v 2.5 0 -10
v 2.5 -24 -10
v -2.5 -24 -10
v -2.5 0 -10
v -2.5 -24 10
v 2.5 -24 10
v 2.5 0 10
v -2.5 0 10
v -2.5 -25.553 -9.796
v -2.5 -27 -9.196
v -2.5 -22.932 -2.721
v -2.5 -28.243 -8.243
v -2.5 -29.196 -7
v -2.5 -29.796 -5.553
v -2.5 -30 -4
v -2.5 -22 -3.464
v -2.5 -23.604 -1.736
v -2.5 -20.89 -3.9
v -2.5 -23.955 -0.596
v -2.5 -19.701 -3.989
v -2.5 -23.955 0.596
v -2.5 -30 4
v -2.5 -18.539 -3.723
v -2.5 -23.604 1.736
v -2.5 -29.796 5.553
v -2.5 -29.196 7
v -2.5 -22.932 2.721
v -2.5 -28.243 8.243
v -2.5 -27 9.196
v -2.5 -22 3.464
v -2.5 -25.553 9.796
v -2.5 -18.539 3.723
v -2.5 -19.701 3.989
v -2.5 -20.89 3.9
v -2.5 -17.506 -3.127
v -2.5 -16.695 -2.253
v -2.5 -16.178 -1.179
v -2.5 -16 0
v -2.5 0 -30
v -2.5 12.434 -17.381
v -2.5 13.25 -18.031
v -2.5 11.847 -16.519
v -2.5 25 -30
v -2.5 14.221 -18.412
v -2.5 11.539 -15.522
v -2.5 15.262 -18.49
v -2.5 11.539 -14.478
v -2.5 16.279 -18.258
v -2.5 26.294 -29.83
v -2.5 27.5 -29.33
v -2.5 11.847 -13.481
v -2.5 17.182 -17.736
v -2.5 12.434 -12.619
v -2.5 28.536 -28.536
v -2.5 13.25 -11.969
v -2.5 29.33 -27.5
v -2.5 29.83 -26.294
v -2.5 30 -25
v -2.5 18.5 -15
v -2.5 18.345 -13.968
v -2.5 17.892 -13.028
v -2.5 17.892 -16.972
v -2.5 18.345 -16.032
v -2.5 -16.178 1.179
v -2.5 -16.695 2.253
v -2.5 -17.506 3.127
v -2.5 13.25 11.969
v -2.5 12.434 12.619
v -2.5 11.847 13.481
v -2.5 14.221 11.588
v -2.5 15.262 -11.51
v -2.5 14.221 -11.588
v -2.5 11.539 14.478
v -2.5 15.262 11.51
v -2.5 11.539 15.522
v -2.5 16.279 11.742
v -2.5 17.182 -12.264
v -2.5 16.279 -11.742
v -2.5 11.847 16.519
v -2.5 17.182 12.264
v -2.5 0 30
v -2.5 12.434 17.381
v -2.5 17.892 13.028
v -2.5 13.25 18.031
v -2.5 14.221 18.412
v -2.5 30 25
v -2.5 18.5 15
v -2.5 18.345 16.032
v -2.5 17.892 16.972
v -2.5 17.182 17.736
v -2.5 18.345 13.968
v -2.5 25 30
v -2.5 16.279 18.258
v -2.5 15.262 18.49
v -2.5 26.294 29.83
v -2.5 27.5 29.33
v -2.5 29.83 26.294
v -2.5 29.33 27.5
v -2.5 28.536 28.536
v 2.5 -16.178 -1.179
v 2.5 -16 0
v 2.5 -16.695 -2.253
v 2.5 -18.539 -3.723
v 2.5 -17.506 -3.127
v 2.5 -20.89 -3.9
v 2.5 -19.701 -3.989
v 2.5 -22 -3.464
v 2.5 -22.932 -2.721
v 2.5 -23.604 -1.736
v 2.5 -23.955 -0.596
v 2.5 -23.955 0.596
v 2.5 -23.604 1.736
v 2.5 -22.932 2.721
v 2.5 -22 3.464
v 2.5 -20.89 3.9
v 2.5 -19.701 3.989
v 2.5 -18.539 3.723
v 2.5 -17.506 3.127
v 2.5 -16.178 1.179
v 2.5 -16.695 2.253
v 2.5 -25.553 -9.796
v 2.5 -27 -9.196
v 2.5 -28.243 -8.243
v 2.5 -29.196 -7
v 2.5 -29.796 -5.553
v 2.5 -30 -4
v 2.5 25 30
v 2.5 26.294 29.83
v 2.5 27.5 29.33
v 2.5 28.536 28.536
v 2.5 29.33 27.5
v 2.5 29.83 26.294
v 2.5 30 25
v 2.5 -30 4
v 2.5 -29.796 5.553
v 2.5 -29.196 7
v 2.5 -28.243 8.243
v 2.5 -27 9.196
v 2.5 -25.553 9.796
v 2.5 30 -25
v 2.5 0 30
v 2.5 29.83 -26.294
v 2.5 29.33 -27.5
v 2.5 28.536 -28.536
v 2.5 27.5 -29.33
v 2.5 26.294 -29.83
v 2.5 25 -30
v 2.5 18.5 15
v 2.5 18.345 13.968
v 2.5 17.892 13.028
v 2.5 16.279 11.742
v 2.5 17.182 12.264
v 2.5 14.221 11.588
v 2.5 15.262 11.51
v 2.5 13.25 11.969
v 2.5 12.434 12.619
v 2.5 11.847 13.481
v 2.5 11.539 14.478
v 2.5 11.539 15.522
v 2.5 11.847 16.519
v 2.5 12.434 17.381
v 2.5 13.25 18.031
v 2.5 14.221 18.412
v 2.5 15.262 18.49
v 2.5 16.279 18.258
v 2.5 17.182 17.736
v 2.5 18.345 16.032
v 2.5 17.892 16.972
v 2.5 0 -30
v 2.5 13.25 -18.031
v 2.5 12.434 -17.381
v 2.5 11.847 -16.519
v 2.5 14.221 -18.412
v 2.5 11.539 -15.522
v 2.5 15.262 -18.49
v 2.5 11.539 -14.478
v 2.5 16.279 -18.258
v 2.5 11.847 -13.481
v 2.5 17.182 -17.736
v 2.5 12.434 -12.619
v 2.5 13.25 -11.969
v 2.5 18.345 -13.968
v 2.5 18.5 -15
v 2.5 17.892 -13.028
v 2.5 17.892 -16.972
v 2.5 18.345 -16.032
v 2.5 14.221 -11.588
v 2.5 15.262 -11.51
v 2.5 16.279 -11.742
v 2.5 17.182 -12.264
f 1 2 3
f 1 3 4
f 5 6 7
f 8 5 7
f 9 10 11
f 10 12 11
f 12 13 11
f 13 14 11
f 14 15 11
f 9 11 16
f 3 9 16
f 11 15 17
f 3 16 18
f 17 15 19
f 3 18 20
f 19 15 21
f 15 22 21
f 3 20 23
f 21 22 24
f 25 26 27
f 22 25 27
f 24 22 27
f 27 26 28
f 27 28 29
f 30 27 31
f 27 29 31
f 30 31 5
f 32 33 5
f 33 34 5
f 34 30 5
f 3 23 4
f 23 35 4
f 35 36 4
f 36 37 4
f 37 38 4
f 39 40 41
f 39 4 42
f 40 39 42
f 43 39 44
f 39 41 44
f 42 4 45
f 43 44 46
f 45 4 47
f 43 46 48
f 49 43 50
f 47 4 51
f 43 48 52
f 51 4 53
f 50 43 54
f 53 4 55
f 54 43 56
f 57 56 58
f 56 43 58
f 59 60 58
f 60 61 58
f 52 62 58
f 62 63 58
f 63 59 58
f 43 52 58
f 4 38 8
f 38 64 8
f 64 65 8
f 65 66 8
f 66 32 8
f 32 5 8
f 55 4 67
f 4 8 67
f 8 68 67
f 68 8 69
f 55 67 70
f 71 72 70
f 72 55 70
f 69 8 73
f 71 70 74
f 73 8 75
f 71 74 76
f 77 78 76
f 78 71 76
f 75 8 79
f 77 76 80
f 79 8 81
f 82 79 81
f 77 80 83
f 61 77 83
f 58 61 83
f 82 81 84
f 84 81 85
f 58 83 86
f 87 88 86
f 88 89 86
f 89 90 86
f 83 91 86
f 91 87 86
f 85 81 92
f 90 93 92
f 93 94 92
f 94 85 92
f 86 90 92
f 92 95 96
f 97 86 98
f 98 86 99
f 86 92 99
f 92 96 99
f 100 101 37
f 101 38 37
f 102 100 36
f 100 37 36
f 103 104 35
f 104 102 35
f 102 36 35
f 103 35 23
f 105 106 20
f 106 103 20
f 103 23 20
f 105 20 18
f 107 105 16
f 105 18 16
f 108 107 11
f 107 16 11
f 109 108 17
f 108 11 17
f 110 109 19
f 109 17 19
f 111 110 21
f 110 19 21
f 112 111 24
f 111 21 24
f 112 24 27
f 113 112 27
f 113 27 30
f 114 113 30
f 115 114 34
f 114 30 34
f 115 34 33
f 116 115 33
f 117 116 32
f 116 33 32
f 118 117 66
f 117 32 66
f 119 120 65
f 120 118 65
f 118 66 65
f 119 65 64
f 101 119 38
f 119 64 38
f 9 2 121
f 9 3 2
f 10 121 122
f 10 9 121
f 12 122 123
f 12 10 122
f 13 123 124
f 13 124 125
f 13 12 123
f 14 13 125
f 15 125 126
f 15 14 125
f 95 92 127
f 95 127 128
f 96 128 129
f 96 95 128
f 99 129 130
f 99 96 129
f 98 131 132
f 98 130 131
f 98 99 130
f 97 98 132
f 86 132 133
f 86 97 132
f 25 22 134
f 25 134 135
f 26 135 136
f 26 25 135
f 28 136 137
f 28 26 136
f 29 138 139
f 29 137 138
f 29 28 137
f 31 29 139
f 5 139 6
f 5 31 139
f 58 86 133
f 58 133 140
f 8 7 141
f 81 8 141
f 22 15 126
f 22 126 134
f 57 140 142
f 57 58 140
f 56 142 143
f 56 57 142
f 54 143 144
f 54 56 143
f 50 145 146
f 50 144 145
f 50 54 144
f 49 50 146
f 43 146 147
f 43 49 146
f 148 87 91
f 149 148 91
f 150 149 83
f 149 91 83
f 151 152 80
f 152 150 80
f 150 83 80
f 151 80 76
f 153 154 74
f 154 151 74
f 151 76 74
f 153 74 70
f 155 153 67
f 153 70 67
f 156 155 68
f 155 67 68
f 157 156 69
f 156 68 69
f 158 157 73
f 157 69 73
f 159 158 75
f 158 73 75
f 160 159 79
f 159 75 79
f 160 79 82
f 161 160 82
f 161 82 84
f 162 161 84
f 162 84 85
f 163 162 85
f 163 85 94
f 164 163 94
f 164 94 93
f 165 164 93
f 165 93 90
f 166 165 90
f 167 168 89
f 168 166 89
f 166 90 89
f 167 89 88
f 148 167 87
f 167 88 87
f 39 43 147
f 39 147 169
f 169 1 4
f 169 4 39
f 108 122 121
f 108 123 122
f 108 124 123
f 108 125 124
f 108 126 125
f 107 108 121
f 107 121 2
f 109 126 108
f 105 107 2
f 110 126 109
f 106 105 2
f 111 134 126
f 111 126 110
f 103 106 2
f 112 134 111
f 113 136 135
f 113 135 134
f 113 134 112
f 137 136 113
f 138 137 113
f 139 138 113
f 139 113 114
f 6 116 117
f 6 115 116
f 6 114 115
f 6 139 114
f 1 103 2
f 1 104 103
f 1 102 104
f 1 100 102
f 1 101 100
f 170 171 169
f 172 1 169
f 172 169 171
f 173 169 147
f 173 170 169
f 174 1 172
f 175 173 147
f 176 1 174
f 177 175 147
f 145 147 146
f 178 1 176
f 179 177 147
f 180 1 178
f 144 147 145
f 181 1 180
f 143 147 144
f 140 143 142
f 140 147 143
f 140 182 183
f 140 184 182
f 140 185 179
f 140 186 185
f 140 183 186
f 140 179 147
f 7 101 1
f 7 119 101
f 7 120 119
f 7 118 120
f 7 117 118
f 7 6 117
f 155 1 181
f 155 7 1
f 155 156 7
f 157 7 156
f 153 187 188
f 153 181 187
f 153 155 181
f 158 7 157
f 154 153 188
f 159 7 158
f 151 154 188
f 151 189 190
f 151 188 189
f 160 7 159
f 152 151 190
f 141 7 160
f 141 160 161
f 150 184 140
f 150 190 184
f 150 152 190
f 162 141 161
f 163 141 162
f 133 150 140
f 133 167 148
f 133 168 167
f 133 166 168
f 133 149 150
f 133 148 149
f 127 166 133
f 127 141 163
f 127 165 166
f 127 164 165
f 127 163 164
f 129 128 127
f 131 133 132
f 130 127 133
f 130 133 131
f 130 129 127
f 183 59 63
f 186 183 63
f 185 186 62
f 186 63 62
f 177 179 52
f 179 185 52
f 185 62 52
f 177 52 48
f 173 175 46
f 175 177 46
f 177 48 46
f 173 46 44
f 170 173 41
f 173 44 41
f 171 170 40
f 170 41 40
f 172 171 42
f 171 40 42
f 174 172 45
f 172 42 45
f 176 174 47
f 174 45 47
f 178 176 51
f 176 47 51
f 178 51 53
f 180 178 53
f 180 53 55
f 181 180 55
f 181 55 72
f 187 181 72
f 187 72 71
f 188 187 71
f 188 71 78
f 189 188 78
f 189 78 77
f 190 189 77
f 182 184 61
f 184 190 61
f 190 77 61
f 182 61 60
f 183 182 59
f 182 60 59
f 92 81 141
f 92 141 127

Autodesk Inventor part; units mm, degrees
ref_plane "YZ Plane" through (0, 0, 0) normal (1, 0, 0) x (0, 1, 0)
ref_plane "XZ Plane" through (0, 0, 0) normal (0, 1, 0) x (-1, 0, 0)
ref_plane "XY Plane" through (0, 0, 0) normal (0, 0, 1) x (1, 0, 0)
sketch "Sketch1" plane through (0, 0, 0) normal (1, 0, 0) x (0, 1, 0)
  line L0 (-25, 30) -> (25, 30)
  line L1 (30, 25) -> (30, -25)
  line L2 (25, -30) -> (-25, -30)
  line L3 (-30, -25) -> (-30, 25)
  line L4 (-30, 30) -> (30, -30) construction
  line L5 (30, 30) -> (-30, -30) construction
  arc A0 (-25, 30) -> (-30, 25) centre (-25, 25) ccw
  arc A1 (-30, -25) -> (-25, -30) centre (-25, -25) ccw
  arc A2 (25, -30) -> (30, -25) centre (25, -25) ccw
  arc A3 (30, 25) -> (25, 30) centre (25, 25) ccw
  circle A4 centre (-20, 0) radius 4
  circle A5 centre (15, 15) radius 3.5
  circle A6 centre (15, -15) radius 3.5
  point P0 (0, 0)
  dimension "d0" = 60
  dimension "d1" = 60
  dimension "d6" = 5
  dimension "d7" = 8
  dimension "d10" = 15
  dimension "d11" = 30
  dimension "d12" = 15
  dimension "d13" = 7
  dimension "d14" = 35
extrude "Plate1" add sketch "Sketch1" along normal mid plane 5
sketch "Sketch2" plane through (2.5, 0, 0) normal (1, 0, 0) x (0, 0, -1)
  line L0 (-30, -30) -> (-10, -30)
  line L1 (-10, -30) -> (-10, 0)
  line L2 (-10, 0) -> (-30, 0)
  line L3 (-30, 0) -> (-30, -30)
  line L4 (30, -30) -> (10, -30)
  line L5 (10, -30) -> (10, 0)
  line L6 (10, 0) -> (30, 0)
  line L7 (30, 0) -> (30, -30)
  circle A0 centre (-15, 15) radius 3.5 projected
  circle A1 centre (0, -20) radius 4 projected
  line L8 (-30, -25) -> (-30, 25) construction
  point P0 (0, 0)
  dimension "d15" = 15
  dimension "d17" = 10
  dimension "d18" = 10
  dimension "d19" = 30
extrude "Cut1" cut sketch "Sketch2" against normal blind 5 contours L3 L2 L1 L0 | L4 L5 L6 L7
fillet "Corner Round1" radius 6 2 edges at (0, -30, 10) (0, -30, -10)
equation "\"d20\" = Thickness"
equation "\"d9\" = Thickness"
equation "\"BendRadius\" = Thickness"
equation "\"BendReliefWidth\" = Thickness"
equation "\"BendReliefDepth\" = 0.5 * Thickness"
equation "\"TransitionRadius\" = BendRadius"
equation "\"JacobiRadiusSize\" = BendRadius"
equation "\"GapSize\" = Thickness"
equation "\"Thickness\" = 5"
properties part number "HCMUTE-CDT23-BAT_CANG_BANG_TAI" material "Stainless Steel"
